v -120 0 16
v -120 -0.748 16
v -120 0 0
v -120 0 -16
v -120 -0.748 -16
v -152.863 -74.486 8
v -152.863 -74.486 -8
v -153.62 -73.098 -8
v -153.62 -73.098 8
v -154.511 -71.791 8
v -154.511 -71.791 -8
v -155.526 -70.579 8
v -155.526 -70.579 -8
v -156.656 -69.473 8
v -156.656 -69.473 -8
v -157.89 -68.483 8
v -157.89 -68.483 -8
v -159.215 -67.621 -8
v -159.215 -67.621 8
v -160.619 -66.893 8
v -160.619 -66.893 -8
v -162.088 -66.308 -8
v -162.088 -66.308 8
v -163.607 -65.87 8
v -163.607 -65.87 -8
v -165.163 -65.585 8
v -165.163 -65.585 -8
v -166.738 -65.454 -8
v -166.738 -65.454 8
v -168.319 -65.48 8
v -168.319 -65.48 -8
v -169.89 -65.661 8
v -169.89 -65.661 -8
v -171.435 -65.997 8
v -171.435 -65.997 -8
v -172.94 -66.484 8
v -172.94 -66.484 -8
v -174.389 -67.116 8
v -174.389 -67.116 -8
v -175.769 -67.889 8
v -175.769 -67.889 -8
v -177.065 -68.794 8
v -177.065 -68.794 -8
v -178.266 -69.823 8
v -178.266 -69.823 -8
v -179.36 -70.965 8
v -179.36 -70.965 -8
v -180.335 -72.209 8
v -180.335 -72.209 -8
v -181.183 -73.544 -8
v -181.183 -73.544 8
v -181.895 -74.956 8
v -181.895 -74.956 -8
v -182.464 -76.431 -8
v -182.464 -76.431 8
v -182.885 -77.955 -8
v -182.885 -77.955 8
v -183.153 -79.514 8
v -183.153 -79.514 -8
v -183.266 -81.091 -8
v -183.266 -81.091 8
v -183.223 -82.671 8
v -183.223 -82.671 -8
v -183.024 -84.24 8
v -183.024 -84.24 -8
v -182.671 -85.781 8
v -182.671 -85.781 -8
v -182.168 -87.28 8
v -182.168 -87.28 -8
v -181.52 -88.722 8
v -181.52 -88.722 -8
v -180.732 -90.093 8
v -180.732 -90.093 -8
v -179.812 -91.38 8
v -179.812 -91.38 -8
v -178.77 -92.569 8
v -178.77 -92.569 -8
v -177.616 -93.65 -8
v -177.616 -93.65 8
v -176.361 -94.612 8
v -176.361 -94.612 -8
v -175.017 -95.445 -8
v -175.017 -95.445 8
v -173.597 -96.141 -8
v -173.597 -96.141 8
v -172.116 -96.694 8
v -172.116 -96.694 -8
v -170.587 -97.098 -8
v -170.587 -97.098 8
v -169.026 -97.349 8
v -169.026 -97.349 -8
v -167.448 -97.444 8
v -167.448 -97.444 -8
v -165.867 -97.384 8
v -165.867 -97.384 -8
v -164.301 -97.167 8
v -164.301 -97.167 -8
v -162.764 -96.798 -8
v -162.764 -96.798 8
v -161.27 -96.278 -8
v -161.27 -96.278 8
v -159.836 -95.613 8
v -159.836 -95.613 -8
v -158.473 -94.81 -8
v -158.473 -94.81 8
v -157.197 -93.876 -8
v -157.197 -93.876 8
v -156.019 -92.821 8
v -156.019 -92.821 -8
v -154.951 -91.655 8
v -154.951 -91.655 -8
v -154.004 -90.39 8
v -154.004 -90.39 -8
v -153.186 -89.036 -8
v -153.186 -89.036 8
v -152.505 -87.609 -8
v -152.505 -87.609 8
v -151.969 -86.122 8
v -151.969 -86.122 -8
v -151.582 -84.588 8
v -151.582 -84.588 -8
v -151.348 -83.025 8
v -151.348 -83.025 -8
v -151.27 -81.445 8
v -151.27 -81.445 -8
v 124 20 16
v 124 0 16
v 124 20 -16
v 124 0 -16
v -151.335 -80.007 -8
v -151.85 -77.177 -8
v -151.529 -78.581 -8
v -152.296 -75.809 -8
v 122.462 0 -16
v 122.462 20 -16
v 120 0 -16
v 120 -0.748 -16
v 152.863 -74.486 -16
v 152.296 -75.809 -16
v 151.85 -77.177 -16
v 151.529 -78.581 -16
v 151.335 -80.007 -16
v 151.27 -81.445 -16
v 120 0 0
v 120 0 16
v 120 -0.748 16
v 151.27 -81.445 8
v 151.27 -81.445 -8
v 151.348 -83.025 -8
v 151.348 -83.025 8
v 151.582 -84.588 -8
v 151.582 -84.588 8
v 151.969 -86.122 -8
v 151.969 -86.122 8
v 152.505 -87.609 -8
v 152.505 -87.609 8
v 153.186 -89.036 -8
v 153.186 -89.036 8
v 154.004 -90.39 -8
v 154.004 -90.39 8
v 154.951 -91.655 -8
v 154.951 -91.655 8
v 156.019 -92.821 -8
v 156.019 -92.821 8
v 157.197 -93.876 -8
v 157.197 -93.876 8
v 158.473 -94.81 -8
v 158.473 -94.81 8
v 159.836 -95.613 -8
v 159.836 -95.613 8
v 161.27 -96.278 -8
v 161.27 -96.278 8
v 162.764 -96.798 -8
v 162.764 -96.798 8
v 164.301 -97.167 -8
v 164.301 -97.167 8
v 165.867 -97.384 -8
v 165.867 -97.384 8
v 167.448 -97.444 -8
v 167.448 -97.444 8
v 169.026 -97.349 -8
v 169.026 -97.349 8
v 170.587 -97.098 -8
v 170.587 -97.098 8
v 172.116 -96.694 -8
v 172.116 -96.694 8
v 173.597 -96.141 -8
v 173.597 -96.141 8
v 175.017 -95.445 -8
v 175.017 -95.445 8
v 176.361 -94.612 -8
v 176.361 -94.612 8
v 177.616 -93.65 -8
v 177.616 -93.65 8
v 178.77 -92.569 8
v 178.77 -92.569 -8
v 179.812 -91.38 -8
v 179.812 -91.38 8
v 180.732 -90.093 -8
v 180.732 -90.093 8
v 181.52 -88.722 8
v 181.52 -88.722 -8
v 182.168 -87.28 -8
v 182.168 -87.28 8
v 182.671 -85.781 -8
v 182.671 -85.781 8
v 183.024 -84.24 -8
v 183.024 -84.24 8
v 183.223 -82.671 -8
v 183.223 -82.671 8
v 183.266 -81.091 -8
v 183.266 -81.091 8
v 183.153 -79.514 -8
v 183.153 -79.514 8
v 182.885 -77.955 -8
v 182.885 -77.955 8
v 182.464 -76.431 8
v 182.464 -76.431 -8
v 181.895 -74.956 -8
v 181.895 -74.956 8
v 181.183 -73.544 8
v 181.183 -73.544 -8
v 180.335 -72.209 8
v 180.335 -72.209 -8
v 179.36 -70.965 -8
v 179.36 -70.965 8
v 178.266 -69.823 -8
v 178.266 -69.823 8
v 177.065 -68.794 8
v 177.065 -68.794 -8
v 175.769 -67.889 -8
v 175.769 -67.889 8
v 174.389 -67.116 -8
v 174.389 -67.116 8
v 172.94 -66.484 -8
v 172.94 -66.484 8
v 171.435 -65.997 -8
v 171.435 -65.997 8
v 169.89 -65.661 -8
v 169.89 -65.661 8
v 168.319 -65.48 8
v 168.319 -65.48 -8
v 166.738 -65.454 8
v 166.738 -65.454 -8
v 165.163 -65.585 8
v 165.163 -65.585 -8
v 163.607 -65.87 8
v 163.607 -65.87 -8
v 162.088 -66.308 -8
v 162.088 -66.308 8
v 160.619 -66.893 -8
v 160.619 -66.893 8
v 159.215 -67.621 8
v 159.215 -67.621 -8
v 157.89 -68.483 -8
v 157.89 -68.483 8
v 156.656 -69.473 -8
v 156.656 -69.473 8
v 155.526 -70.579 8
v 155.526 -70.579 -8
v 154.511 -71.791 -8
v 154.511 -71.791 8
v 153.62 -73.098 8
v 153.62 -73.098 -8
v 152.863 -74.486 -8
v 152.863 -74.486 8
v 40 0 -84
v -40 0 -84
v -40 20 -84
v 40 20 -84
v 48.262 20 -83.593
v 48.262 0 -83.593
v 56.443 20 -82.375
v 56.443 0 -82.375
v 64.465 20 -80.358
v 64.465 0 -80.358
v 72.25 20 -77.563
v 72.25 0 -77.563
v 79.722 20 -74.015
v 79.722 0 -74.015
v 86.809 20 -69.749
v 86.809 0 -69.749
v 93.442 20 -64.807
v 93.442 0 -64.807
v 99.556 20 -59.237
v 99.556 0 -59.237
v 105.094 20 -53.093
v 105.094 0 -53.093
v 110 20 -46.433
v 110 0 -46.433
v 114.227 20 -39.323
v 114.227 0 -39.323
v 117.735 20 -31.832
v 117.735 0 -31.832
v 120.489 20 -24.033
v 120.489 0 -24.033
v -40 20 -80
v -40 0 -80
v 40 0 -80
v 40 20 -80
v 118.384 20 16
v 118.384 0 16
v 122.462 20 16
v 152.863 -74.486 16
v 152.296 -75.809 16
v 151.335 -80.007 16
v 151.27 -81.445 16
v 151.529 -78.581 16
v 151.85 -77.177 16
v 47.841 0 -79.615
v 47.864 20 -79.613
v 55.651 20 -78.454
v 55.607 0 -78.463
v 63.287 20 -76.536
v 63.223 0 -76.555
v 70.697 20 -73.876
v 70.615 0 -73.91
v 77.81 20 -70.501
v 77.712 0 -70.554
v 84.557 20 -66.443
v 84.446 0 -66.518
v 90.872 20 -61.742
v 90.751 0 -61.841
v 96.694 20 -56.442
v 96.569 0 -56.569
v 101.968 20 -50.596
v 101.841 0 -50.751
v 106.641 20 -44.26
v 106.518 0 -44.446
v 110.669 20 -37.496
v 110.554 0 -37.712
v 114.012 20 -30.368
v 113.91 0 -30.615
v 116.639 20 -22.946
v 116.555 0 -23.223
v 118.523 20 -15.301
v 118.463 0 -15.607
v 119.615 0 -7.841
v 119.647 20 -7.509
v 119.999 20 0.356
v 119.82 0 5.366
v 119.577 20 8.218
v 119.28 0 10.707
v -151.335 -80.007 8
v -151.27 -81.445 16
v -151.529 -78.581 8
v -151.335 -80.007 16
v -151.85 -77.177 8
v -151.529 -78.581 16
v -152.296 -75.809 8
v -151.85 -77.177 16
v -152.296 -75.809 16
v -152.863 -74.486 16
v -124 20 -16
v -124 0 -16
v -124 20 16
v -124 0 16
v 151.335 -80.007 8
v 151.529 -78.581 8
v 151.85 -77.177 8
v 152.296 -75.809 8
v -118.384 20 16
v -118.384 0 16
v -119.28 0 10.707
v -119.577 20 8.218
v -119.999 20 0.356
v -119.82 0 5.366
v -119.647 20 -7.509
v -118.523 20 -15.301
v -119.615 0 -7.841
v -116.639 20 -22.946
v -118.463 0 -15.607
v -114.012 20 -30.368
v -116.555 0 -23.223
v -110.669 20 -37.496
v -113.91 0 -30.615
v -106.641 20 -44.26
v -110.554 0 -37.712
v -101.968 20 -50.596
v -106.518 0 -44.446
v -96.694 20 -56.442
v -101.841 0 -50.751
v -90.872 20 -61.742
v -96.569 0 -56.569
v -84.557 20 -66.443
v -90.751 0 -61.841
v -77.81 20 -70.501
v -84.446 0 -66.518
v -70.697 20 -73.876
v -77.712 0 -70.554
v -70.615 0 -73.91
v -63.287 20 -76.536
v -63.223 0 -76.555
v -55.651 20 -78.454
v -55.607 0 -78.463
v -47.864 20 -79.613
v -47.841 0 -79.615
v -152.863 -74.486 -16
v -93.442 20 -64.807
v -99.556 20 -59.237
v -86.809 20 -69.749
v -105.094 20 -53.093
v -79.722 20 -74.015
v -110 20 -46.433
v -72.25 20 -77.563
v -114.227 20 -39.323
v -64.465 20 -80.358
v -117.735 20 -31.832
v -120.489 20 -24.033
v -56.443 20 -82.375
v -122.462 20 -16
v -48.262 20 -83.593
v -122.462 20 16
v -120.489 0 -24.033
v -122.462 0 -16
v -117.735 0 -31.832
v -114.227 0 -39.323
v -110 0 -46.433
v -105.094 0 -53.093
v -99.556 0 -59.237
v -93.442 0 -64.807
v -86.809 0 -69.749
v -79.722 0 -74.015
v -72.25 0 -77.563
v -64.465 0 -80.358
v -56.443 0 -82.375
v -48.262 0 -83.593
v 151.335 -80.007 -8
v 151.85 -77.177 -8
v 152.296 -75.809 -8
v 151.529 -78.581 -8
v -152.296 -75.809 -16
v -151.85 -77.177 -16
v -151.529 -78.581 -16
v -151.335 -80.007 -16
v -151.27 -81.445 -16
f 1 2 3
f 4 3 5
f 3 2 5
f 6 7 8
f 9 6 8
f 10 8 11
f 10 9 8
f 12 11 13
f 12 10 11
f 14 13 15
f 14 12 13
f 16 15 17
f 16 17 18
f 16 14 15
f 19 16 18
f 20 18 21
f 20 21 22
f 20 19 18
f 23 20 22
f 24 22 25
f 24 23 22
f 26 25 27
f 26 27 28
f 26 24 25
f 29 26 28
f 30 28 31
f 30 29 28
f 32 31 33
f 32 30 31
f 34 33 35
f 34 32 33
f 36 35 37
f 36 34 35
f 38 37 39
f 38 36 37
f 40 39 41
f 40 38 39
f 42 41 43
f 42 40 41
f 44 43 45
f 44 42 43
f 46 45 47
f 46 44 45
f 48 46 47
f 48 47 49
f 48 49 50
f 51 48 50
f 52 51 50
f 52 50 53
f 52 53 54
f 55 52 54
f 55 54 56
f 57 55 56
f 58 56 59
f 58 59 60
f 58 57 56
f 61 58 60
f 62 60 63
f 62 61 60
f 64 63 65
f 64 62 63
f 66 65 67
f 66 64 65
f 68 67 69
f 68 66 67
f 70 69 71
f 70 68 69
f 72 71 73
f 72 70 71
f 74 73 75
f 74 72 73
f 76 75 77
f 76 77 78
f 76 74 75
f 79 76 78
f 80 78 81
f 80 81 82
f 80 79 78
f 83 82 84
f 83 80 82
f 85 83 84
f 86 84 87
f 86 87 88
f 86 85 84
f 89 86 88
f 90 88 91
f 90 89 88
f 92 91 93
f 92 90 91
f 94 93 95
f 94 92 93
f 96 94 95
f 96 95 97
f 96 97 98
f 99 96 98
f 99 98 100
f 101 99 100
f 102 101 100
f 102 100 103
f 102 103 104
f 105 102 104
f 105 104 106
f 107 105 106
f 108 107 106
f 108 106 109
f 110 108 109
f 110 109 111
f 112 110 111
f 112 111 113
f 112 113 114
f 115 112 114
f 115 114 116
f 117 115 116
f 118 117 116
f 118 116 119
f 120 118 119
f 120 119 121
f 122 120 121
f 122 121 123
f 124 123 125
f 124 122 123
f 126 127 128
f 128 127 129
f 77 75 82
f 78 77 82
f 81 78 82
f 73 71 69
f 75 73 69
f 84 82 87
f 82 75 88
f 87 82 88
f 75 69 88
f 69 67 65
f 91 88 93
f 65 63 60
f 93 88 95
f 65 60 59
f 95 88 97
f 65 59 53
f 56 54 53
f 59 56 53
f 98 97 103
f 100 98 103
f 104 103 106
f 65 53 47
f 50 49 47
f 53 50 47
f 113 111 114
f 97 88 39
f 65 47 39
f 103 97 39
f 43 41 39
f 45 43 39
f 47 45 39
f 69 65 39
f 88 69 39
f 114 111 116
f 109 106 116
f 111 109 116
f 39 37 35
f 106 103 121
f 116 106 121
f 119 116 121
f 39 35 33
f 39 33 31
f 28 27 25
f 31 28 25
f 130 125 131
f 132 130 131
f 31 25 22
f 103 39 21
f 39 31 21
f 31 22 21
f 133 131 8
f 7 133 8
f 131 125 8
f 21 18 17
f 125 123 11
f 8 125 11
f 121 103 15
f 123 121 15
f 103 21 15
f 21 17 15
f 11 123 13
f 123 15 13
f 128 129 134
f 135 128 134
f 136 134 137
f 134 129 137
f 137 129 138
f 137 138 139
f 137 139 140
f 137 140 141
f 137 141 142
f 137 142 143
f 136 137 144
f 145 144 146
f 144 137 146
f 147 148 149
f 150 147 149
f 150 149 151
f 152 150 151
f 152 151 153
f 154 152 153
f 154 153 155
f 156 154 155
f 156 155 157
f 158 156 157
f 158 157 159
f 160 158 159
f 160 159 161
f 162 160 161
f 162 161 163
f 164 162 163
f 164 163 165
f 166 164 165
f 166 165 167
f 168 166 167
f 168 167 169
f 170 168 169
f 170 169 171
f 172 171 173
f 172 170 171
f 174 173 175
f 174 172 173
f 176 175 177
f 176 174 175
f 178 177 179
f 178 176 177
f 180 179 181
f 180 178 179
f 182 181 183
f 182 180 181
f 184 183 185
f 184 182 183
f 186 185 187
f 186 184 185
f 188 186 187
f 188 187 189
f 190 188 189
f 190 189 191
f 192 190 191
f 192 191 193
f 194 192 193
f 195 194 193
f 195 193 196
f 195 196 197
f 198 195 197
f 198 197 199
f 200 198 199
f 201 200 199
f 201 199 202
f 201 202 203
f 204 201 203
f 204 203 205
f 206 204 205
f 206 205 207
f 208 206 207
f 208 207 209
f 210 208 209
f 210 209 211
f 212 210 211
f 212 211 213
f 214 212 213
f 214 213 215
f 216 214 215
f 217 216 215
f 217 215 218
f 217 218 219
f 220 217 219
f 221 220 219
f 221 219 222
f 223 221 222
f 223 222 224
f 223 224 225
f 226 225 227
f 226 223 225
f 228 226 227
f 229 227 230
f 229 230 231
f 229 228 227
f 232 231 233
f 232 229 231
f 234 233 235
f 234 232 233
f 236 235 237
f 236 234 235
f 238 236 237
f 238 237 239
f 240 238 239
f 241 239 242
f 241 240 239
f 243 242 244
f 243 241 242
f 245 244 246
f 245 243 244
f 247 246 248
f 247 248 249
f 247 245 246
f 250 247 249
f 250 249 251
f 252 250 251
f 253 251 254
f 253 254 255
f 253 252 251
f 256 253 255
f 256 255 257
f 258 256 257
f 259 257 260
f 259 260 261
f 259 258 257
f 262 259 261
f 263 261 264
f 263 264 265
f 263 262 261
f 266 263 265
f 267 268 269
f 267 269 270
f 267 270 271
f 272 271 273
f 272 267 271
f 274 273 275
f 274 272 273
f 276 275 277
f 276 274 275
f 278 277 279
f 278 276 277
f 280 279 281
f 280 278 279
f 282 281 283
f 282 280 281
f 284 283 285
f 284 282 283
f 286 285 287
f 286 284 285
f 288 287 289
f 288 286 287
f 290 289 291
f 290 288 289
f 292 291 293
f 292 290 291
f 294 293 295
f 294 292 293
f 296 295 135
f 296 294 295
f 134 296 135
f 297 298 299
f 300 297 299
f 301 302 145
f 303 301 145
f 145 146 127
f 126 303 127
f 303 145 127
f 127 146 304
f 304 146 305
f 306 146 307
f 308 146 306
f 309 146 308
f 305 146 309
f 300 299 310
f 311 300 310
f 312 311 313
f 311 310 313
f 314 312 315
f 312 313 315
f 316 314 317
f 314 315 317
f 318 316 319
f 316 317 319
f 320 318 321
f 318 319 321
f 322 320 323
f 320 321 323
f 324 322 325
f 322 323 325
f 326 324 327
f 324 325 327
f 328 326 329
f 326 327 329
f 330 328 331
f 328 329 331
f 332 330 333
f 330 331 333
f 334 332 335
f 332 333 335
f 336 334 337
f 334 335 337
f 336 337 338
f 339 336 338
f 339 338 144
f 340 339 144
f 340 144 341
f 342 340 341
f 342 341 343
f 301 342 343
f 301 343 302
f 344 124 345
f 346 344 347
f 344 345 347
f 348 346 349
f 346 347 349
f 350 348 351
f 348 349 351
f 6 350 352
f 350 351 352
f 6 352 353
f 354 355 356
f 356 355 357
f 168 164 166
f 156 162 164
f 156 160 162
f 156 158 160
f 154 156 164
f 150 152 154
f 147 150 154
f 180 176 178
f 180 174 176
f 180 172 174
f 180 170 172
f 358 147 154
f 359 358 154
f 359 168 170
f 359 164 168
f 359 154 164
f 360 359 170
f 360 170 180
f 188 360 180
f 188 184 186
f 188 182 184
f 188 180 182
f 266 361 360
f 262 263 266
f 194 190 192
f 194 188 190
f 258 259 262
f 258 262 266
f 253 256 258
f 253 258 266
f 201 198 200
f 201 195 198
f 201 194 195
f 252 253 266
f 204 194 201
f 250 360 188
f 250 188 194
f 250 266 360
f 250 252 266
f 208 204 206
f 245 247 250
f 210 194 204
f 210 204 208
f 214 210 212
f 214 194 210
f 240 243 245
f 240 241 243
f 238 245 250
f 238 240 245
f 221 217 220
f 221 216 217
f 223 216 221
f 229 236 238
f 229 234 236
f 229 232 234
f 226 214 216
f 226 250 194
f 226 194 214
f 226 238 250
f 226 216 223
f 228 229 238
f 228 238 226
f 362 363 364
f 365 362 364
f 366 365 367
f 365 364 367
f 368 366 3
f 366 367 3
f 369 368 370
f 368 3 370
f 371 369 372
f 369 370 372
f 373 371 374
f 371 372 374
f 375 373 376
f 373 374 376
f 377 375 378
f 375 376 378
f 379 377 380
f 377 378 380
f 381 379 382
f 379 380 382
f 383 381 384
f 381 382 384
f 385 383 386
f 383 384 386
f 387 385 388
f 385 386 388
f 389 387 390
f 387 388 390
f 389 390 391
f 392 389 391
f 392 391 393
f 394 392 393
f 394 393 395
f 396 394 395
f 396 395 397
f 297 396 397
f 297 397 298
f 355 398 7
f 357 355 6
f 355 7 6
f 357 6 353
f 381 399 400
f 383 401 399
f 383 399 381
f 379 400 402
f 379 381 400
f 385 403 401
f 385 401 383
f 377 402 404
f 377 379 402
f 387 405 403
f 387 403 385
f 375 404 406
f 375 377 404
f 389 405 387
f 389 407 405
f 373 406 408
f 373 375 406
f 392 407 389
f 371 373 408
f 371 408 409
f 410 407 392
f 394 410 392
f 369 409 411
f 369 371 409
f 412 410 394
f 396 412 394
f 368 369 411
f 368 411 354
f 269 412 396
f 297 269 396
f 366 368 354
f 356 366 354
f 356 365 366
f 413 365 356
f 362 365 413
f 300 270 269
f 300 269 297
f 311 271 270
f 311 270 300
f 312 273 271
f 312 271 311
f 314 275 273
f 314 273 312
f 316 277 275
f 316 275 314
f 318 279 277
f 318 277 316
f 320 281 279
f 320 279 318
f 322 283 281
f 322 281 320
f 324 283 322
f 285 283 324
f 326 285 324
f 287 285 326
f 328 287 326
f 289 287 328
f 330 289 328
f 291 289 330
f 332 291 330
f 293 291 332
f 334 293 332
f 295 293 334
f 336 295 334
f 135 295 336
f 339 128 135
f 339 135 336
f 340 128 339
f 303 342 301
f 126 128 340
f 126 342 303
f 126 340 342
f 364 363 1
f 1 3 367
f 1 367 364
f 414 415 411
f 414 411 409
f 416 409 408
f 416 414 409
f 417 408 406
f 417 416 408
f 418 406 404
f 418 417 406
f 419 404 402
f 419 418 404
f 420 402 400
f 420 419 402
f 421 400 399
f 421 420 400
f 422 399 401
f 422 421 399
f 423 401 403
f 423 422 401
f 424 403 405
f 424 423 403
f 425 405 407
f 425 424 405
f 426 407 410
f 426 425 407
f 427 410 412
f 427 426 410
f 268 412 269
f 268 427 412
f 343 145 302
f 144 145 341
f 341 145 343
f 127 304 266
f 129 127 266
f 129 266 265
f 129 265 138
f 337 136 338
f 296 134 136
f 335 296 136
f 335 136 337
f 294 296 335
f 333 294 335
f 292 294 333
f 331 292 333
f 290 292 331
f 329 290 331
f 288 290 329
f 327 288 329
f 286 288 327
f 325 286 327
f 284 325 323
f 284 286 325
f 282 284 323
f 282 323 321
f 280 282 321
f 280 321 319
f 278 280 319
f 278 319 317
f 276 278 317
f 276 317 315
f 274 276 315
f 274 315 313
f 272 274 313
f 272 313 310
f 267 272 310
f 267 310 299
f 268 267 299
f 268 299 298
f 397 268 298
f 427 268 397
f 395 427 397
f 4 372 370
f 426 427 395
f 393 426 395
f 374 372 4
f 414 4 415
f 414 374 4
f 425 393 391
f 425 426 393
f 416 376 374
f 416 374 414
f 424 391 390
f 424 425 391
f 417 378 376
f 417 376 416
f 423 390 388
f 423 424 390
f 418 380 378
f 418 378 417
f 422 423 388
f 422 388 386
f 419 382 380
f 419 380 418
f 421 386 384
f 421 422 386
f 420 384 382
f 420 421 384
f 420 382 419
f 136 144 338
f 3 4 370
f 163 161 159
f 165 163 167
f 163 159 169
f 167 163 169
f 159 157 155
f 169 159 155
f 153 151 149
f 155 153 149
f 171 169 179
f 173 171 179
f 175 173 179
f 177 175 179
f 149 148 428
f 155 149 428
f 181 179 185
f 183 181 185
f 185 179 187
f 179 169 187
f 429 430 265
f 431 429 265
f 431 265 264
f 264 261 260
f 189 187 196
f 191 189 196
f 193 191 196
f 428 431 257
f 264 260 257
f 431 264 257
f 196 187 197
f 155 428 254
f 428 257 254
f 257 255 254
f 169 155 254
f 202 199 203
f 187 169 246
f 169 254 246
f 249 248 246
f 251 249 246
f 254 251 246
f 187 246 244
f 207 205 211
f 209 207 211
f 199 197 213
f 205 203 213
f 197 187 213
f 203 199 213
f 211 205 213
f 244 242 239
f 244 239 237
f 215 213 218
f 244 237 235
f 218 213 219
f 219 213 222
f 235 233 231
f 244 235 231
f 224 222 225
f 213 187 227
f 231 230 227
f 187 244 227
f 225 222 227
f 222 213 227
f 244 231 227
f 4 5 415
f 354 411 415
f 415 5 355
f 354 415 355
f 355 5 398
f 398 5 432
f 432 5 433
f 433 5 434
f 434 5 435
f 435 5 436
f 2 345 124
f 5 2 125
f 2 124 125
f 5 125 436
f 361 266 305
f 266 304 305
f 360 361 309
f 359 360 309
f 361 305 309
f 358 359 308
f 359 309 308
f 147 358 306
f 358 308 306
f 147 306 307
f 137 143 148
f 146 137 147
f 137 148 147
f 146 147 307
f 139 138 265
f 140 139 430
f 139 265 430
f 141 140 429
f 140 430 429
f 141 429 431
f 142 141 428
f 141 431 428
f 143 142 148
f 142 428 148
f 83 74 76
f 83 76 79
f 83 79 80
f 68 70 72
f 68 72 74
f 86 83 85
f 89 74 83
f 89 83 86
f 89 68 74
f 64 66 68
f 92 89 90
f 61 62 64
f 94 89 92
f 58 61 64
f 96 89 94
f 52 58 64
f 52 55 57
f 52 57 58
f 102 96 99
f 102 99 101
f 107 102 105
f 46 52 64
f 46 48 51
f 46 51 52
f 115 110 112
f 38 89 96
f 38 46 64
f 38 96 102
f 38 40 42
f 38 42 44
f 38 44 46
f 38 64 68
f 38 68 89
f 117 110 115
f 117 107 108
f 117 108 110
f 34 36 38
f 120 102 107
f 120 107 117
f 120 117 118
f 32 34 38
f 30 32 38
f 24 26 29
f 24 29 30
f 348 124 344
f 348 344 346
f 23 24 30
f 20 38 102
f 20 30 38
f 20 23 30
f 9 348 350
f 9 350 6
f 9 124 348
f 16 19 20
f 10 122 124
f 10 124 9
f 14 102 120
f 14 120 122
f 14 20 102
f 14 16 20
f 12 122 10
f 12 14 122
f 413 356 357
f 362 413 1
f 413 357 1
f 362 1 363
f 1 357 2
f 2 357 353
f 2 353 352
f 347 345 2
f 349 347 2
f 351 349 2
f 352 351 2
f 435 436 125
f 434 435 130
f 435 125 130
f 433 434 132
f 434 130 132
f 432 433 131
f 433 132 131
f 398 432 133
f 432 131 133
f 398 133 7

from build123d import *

# Parameters (mm, degrees)
EXTRUDE_1_DEPTH     = 20
SKETCH_8_W          = 4
SKETCH_8_H          = 32
SKETCH_11_W         = 4
SKETCH_11_H         = 32
SKETCH_13_R         = 16
CUT_EXTRUDE_4_DEPTH = 202.639119047
SKETCH_16_R         = 16
EXTRUDE_4_DEPTH     = 8
SKETCH_17_W         = 276.65605666
SKETCH_17_H         = 73.661463051
CUT_EXTRUDE_5_DEPTH = 234.318180858


with BuildPart() as part:
    # 草图2 → 凸台-拉伸1 (new body)
    with BuildSketch(Plane(origin=(0, 0, 0), x_dir=(1, 0, 0), z_dir=(0, 1, 0))):
        with BuildLine():
            Line((-40, 84), (40, 84))
            ThreePointArc((40, 84), (124, 0), (40, -84))
            Line((40, -84), (-40, -84))
            ThreePointArc((-40, -84), (-124, 0), (-40, 84))
        make_face()
        with BuildLine():
            Line((-40, 80), (40, 80))
            ThreePointArc((40, 80), (120, 0), (40, -80))
            Line((40, -80), (-40, -80))
            ThreePointArc((-40, -80), (-120, 0), (-40, 80))
        make_face(mode=Mode.SUBTRACT)
    extrude(amount=EXTRUDE_1_DEPTH)

    # 扫描1: sweep along a path in 草图9
    with BuildLine(Plane.XY) as sweep_1_path:
        Line((-124, 20), (-124, 0))
        Line((-124, 0), (-155, -80))
    # 草图8 → 扫描1 (sweep)
    with BuildSketch(Plane(origin=(0, 20, 0), x_dir=(1, 0, 0), z_dir=(0, 1, 0))):
        with Locations((-122, 0)):
            Rectangle(SKETCH_8_W, SKETCH_8_H)
    sweep(path=sweep_1_path.line, transition=Transition.RIGHT)

    # 扫描2: sweep along a path in 草图12
    with BuildLine(Plane.XY) as sweep_2_path:
        Line((124, 20), (124, 0))
        Line((124, 0), (155, -80))
    # 草图11 → 扫描2 (sweep)
    with BuildSketch(Plane(origin=(0, 20, 0), x_dir=(1, 0, 0), z_dir=(0, 1, 0))):
        with Locations((122, 0)):
            Rectangle(SKETCH_11_W, SKETCH_11_H)
    sweep(path=sweep_2_path.line, transition=Transition.RIGHT)

    # 草图13 → 切除-拉伸4 (cut, through all)
    with BuildSketch(Plane.XY.offset(16)):
        with Locations((-167.270234139, -81.445284271)):
            Circle(SKETCH_13_R)
        with Locations((167.270234139, -81.445284271)):
            Circle(SKETCH_13_R)
    extrude(amount=-CUT_EXTRUDE_4_DEPTH, mode=Mode.SUBTRACT)

    # 草图16 → 凸台-拉伸4 (add, symmetric)
    with BuildSketch(Plane.XY):
        with Locations((167.270234139, -81.445284271)):
            Circle(SKETCH_16_R)
        with Locations((-167.270234139, -81.445284271)):
            Circle(SKETCH_16_R)
    extrude(amount=EXTRUDE_4_DEPTH, both=True)

    # 草图17 → 切除-拉伸5 (cut, through all)
    with BuildSketch(Plane(origin=(0, 20, 0), x_dir=(1, 0, 0), z_dir=(0, 1, 0))):
        with Locations((14.32802833, -52.830731526)):
            Rectangle(SKETCH_17_W, SKETCH_17_H)
    extrude(amount=-CUT_EXTRUDE_5_DEPTH, mode=Mode.SUBTRACT)


solid = part.part
